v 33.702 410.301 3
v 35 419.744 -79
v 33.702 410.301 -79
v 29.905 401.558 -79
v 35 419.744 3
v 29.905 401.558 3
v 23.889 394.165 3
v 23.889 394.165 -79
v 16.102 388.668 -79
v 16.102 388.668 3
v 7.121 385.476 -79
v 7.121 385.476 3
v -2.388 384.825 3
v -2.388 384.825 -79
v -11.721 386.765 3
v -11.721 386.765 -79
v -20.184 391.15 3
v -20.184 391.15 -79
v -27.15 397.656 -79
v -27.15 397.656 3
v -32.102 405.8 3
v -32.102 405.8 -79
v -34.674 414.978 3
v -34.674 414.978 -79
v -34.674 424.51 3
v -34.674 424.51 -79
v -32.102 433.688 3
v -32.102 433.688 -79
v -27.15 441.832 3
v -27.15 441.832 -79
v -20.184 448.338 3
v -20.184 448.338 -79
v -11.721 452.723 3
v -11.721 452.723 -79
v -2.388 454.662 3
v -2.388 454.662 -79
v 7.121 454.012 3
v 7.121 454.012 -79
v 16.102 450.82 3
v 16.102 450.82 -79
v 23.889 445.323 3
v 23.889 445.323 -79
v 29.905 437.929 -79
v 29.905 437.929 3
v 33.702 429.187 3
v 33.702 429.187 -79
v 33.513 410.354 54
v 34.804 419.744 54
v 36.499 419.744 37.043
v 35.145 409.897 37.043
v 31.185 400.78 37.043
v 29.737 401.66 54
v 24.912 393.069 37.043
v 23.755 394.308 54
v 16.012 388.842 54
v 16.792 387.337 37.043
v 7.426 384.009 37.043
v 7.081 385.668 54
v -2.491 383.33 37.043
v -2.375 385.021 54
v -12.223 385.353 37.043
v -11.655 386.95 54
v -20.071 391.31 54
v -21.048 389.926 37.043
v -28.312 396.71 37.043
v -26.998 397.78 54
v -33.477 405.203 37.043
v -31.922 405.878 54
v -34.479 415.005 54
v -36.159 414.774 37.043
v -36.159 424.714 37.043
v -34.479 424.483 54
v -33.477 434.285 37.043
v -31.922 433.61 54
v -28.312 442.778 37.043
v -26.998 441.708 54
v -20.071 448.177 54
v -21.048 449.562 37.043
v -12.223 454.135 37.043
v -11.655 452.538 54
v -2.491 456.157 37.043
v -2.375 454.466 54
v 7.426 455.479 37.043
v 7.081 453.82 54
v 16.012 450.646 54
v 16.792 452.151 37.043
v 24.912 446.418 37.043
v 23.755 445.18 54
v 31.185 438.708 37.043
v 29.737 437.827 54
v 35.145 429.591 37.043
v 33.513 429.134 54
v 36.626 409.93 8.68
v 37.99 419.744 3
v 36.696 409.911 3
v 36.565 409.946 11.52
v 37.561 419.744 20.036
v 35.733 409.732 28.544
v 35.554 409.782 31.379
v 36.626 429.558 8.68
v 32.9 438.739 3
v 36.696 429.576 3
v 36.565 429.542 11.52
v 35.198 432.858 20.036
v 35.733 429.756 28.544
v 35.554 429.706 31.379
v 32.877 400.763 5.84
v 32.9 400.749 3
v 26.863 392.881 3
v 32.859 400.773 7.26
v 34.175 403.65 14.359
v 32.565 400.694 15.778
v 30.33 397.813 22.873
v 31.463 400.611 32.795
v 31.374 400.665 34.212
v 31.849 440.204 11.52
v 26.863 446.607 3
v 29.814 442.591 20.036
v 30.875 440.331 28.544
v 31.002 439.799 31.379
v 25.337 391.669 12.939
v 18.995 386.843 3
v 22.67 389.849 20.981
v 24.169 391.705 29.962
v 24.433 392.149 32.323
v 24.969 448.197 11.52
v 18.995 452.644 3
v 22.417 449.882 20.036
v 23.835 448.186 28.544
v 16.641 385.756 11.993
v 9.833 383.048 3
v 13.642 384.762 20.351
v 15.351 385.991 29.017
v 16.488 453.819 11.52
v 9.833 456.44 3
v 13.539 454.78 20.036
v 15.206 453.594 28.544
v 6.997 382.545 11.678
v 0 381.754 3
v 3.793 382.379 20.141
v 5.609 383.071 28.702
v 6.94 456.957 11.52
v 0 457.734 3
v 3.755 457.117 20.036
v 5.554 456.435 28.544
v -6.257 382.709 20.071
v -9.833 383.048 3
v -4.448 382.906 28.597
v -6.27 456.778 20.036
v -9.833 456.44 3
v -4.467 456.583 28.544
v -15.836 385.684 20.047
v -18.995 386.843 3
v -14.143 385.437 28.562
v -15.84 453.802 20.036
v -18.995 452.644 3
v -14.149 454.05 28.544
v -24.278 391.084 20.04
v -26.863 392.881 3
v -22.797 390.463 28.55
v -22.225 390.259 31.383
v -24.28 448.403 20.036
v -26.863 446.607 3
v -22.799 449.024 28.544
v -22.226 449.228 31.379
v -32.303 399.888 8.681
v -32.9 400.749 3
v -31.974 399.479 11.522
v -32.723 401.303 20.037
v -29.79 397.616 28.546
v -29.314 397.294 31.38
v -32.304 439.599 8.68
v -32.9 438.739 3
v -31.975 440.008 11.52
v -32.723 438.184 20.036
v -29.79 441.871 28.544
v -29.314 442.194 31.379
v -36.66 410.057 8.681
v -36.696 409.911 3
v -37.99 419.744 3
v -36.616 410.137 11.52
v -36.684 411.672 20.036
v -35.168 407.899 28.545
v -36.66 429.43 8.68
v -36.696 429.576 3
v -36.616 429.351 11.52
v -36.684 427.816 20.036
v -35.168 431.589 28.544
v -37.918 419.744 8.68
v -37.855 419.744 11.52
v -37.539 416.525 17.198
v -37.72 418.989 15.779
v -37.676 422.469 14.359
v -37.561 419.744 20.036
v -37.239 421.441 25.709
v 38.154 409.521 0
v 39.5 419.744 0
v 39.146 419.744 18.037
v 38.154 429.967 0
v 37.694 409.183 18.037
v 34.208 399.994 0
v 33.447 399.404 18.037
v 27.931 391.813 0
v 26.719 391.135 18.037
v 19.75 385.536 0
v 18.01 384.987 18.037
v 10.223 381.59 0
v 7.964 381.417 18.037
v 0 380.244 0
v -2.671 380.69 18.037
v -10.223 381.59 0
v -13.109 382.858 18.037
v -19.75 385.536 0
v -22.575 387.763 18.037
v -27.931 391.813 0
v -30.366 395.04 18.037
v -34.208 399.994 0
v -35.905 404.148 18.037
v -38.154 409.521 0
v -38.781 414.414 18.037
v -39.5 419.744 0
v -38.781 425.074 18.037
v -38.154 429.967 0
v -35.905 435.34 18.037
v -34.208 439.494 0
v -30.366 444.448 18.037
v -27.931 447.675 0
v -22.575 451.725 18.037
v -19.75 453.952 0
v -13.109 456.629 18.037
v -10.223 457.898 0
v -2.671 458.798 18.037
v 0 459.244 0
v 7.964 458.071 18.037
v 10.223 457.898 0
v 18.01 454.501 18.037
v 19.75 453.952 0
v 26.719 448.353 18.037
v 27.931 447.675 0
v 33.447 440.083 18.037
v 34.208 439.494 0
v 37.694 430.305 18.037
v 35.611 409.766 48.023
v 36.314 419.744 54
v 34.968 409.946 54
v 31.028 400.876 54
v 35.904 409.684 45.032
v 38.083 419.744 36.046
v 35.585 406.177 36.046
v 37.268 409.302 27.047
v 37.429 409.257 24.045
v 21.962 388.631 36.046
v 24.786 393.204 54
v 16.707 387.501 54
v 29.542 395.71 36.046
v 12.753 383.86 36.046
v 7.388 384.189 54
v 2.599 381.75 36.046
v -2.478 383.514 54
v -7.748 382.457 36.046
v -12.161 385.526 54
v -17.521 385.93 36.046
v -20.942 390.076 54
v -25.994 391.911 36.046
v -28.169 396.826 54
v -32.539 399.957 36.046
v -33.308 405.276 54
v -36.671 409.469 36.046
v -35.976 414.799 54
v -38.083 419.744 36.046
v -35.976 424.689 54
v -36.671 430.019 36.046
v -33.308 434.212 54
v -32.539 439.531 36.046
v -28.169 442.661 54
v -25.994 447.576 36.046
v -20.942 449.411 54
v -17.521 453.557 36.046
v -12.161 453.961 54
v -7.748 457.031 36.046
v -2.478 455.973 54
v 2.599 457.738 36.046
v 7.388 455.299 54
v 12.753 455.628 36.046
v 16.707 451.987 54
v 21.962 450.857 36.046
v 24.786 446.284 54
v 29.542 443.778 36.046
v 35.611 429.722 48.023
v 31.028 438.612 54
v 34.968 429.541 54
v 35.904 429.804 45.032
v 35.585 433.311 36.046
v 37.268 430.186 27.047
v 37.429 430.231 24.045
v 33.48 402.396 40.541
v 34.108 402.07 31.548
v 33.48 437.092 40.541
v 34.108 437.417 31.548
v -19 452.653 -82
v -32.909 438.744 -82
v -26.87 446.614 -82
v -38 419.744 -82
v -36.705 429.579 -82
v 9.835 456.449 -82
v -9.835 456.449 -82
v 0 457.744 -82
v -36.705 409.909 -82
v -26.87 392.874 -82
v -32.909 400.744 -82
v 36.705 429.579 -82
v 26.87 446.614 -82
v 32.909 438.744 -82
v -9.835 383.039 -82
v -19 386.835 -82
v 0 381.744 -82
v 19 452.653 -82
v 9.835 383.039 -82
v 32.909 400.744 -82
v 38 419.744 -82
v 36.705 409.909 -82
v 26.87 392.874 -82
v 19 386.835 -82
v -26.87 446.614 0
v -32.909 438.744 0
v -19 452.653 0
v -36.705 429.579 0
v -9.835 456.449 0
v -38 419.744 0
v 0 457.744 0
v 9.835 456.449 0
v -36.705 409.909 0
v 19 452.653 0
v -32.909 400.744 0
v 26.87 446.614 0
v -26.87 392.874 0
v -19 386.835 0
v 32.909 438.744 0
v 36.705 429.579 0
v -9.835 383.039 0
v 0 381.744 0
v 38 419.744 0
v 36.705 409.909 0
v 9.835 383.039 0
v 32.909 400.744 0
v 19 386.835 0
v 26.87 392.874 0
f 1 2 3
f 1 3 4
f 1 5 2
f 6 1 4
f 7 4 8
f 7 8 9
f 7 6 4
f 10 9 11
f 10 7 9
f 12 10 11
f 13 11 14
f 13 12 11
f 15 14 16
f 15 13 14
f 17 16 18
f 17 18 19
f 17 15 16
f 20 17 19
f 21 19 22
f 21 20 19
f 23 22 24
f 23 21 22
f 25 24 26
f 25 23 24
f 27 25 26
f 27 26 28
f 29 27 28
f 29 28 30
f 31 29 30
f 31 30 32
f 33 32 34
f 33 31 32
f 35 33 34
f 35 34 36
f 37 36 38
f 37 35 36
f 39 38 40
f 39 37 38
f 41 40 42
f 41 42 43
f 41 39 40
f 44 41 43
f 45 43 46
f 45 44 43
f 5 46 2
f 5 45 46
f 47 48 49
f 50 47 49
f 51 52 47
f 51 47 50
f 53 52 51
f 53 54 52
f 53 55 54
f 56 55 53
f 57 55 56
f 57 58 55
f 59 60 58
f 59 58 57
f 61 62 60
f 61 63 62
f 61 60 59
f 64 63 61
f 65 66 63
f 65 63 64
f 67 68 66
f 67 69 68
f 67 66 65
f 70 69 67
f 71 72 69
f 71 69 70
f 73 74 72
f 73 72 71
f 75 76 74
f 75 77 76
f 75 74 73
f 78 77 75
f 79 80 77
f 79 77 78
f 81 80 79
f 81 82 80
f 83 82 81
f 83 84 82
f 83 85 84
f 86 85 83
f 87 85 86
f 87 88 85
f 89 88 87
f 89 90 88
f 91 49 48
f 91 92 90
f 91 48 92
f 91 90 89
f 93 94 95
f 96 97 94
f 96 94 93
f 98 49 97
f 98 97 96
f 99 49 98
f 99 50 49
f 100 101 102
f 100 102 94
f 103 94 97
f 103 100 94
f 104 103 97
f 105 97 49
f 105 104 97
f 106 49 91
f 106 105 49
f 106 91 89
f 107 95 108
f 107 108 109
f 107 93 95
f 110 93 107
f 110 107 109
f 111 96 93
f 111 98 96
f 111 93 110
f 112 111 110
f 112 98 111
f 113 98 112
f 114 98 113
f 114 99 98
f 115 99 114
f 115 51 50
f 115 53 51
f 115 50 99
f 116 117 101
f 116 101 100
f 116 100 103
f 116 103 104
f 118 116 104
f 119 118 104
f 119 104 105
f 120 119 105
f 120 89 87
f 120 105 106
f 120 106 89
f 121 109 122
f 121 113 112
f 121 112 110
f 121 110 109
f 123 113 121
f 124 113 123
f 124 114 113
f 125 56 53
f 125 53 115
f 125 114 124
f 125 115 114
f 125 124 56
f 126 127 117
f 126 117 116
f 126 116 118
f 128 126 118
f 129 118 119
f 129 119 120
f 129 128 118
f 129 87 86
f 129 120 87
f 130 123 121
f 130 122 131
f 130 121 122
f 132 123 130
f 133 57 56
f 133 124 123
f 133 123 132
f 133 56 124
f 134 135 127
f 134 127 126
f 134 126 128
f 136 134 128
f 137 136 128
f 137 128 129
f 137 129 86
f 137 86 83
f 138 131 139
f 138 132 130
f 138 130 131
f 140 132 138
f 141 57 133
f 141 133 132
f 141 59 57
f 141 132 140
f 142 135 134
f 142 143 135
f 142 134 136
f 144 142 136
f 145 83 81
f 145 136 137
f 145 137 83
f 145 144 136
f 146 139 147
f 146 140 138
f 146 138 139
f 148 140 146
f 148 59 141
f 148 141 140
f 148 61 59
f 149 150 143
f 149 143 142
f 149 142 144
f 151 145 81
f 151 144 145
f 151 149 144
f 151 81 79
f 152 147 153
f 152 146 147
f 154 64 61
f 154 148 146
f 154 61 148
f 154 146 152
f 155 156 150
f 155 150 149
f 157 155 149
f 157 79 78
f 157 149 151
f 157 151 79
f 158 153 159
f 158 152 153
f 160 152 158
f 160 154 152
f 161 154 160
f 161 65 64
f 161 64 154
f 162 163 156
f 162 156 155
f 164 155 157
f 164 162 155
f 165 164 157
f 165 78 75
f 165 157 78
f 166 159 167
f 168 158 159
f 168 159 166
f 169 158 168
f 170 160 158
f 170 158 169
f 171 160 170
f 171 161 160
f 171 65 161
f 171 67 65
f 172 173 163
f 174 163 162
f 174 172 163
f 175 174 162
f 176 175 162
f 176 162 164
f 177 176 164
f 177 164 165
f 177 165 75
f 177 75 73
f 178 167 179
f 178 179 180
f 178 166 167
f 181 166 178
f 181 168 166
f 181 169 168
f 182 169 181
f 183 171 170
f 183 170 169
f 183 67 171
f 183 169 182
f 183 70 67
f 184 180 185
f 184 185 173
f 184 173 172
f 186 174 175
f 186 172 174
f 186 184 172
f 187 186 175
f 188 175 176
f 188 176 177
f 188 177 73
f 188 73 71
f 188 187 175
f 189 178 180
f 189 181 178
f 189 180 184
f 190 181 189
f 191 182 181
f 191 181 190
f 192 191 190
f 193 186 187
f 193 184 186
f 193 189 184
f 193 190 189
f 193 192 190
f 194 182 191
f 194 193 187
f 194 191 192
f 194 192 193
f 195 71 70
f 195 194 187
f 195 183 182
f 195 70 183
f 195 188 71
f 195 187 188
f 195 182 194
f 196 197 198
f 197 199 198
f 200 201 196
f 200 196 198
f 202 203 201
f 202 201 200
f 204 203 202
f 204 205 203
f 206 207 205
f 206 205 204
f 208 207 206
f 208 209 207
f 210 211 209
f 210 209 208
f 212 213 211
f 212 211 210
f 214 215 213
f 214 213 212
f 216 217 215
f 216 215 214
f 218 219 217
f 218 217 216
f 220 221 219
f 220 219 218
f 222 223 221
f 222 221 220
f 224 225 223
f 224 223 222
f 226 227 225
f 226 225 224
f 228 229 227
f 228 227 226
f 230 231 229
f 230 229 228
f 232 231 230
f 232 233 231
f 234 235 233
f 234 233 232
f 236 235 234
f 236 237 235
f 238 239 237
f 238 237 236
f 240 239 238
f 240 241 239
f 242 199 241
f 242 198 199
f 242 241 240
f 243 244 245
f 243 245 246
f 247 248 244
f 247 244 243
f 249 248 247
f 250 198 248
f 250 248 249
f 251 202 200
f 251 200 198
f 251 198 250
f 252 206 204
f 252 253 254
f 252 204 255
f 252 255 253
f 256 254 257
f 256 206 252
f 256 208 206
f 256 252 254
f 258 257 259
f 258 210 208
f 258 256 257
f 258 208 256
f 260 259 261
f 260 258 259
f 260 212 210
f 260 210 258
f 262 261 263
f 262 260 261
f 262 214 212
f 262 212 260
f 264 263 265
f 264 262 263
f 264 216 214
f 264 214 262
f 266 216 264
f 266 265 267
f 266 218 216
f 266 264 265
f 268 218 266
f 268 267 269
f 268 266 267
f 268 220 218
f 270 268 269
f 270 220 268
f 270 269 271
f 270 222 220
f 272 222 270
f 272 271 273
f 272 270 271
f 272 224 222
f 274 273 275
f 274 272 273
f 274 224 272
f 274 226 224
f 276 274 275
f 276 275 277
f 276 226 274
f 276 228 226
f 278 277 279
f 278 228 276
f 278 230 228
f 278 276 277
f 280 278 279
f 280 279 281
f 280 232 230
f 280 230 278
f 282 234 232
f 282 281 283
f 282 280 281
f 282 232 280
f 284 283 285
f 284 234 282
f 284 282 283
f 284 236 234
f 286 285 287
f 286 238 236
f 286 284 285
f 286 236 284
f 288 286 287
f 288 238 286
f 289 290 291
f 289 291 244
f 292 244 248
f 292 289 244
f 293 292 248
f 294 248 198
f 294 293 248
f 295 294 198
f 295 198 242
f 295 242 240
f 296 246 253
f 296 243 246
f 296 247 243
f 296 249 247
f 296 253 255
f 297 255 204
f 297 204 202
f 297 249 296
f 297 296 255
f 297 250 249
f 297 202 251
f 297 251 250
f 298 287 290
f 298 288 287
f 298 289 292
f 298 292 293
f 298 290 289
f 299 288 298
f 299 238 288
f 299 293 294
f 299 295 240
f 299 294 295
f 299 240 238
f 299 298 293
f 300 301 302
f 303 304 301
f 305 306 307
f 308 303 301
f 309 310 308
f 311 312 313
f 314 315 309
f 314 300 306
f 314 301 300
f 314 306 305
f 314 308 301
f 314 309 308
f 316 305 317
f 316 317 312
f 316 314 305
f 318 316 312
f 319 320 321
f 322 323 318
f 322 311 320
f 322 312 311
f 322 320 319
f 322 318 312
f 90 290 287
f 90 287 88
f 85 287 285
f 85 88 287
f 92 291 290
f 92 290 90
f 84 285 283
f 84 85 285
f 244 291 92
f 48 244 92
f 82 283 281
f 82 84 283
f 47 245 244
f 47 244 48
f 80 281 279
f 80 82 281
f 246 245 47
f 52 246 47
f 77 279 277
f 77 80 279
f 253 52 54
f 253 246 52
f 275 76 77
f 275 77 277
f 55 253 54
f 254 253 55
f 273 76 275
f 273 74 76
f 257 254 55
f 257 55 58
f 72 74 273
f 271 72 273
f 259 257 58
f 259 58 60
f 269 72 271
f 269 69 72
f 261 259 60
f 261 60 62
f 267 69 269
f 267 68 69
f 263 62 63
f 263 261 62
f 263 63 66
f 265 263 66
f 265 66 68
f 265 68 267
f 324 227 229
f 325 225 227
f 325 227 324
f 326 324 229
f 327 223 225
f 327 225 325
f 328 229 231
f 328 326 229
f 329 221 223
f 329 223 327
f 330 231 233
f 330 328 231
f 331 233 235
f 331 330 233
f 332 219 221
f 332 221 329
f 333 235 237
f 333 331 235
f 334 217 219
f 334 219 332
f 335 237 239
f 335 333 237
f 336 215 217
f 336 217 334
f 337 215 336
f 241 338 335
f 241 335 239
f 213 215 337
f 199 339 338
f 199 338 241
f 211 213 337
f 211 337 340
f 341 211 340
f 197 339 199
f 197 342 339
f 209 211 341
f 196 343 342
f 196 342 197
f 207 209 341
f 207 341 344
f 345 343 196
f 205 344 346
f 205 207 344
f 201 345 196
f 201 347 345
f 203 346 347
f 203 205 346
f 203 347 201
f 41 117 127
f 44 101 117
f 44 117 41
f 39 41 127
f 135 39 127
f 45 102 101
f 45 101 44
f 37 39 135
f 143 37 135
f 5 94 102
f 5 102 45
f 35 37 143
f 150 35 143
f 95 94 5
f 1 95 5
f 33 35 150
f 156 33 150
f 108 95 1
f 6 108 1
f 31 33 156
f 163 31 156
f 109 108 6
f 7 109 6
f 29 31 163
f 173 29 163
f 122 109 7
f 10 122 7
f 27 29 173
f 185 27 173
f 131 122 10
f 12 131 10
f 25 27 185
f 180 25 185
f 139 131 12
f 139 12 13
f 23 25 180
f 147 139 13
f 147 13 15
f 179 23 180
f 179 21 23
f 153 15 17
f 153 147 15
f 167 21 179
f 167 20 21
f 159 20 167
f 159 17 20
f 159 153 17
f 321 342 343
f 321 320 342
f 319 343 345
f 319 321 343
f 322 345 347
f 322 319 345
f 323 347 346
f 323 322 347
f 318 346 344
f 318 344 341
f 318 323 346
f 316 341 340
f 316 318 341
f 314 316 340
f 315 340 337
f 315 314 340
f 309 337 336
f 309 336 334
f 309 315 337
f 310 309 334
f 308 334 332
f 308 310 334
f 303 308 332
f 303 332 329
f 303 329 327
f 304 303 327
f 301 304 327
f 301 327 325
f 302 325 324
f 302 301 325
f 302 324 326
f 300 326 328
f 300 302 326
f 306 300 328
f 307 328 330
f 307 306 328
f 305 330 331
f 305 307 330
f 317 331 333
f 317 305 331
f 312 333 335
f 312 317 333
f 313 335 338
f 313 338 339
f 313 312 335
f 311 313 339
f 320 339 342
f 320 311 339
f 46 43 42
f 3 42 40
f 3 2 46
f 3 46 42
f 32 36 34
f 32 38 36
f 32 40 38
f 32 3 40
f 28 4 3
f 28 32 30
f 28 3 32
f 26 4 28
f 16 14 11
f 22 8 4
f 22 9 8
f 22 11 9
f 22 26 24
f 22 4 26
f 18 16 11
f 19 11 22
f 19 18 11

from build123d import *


with BuildPart() as part:
    # Sketch1 → Revolve1 (revolve)
    with BuildSketch(Plane(origin=(0, 0, 0), x_dir=(0, 0, -1), z_dir=(1, 0, 0)), mode=Mode.PRIVATE) as revolve1_sk:
        with BuildLine():
            Line((0, 459.243902439), (0, 457.743902439))
            Line((0, 457.743902439), (82, 457.743902439))
            Line((82, 457.743902439), (82, 419.743902439))
            Line((82, 419.743902439), (79, 419.743902439))
            Line((79, 419.743902439), (79, 454.743902439))
            Line((79, 454.743902439), (-3, 454.743902439))
            Line((-3, 454.743902439), (-3, 457.734071509))
            ThreePointArc((-3, 457.734071509), (-28.544499839, 456.853030798), (-54, 454.54755551))
            Line((-54, 454.54755551), (-54, 456.058068592))
            ThreePointArc((-54, 456.058068592), (-27.046947782, 458.446752135), (0, 459.243902439))
        make_face()
    revolve(revolve1_sk.sketch.rotate(Axis((0, 419.743902439, 182.604864627), (0, 0, -1)), 90), axis=Axis((0, 419.743902439, 182.604864627), (0, 0, -1)))


solid = part.part
